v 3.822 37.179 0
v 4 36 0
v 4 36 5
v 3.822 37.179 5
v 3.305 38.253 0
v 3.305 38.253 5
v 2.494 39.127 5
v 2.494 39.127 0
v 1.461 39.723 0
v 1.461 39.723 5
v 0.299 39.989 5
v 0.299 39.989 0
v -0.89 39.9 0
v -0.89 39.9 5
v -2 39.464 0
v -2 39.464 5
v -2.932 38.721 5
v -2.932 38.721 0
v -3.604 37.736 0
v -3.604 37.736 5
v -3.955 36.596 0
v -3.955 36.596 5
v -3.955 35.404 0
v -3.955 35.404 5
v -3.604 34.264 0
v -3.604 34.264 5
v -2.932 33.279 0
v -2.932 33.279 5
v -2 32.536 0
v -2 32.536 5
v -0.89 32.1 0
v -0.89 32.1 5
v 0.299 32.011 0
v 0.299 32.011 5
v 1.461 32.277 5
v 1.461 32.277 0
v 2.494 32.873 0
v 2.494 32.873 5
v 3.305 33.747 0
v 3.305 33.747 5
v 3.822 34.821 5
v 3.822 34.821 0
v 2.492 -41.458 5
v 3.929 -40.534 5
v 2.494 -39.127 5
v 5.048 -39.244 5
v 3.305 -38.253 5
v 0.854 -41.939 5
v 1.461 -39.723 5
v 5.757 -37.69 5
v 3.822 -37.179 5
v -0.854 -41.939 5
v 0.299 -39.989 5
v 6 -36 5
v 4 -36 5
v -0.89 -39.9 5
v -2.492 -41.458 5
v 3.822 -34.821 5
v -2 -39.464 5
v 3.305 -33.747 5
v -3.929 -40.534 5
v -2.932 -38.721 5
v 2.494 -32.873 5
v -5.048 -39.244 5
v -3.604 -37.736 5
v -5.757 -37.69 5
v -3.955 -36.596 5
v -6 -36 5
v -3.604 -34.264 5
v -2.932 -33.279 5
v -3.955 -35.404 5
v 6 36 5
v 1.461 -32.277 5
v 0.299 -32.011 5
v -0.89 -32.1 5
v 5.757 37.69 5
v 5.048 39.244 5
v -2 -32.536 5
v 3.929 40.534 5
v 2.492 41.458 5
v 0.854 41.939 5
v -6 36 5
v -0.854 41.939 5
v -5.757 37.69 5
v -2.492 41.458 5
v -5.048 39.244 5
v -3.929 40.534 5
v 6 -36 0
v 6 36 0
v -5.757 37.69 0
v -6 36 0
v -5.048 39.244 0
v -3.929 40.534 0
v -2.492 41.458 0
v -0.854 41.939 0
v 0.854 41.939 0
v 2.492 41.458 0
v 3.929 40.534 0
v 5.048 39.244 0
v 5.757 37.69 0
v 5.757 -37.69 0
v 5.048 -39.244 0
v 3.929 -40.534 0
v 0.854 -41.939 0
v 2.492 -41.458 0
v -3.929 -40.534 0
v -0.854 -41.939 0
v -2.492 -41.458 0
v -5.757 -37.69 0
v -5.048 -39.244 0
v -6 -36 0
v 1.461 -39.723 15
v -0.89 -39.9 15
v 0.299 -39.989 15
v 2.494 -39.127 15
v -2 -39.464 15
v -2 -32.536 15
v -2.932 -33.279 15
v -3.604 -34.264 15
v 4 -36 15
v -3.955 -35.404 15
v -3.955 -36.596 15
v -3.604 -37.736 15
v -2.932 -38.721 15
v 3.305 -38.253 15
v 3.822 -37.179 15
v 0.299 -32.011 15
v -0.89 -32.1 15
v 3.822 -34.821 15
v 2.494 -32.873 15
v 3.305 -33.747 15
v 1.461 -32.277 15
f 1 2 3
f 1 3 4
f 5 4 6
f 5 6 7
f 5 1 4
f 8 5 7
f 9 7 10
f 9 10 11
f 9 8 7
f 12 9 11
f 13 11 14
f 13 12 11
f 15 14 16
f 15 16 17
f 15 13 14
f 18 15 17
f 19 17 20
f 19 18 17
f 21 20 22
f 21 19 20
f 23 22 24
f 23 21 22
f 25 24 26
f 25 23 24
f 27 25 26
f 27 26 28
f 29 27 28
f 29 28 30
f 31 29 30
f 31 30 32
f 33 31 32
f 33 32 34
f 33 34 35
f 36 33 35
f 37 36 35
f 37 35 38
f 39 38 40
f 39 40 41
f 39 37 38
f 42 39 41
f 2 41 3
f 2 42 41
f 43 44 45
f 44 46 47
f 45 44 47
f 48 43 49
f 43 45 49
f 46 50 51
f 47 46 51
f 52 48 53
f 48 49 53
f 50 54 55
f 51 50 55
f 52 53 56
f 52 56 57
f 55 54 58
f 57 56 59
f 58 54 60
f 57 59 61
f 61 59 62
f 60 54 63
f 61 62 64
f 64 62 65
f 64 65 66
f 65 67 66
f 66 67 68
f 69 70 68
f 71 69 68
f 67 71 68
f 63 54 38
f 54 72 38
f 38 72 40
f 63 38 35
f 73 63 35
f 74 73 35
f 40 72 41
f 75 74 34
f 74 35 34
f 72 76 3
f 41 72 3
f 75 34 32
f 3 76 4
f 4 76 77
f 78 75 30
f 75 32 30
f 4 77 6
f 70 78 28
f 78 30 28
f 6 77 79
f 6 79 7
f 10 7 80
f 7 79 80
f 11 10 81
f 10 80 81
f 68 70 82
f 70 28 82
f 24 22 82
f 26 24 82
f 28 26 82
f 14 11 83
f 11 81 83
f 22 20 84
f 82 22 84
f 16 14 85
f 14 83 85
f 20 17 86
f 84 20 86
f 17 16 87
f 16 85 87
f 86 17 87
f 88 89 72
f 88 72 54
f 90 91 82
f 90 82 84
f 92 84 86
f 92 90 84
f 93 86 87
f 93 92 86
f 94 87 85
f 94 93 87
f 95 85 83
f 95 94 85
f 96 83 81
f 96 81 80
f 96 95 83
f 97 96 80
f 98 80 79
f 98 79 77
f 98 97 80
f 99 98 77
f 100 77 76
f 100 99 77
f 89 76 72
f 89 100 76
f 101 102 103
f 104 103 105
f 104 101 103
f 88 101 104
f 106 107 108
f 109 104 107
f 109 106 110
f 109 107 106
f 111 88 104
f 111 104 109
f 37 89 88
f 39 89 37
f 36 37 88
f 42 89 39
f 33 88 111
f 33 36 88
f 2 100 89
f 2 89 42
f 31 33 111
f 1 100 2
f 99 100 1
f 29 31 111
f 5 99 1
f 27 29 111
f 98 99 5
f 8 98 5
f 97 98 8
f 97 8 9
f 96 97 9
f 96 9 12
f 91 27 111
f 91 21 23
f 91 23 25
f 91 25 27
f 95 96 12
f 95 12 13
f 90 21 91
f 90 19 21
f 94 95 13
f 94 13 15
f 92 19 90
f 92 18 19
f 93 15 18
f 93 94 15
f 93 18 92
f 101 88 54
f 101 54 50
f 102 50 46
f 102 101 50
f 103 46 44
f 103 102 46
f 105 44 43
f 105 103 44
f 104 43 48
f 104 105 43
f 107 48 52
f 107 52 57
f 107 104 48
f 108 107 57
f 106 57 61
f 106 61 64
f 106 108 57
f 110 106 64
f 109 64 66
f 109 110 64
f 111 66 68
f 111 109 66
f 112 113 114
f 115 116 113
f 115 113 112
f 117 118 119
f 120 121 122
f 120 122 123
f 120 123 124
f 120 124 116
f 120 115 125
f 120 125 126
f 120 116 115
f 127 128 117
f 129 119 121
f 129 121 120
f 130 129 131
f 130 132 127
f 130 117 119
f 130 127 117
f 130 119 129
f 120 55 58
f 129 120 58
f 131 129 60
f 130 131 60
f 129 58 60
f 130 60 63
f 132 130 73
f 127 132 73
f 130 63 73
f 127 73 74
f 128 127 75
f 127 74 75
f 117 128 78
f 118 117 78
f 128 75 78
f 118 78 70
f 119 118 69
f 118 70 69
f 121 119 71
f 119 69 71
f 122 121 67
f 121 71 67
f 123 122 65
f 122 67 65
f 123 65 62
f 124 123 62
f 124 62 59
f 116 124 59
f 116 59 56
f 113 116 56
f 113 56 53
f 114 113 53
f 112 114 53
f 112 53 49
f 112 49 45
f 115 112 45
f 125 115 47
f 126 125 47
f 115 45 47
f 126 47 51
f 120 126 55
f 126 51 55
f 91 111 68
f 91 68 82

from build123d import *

# Parameters (mm, degrees)
SKETCH1_R           = 4
BOSS_EXTRUDE1_DEPTH = 5
SKETCH2_R           = 4
BOSS_EXTRUDE2_DEPTH = 10


with BuildPart() as part:
    # Sketch1 → Boss-Extrude1 (new body)
    with BuildSketch(Plane.XY):
        with BuildLine():
            Line((-6, -36), (-6, 36))
            ThreePointArc((-6, 36), (0, 42), (6, 36))
            Line((6, 36), (6, -36))
            ThreePointArc((6, -36), (0, -42), (-6, -36))
        make_face()
        with Locations((0, 36)):
            Circle(SKETCH1_R, mode=Mode.SUBTRACT)
    extrude(amount=BOSS_EXTRUDE1_DEPTH)

    # Sketch2 → Boss-Extrude2 (add)
    with BuildSketch(Plane.XY.offset(5)):
        with Locations((0, -36)):
            Circle(SKETCH2_R)
    extrude(amount=BOSS_EXTRUDE2_DEPTH)


solid = part.part
